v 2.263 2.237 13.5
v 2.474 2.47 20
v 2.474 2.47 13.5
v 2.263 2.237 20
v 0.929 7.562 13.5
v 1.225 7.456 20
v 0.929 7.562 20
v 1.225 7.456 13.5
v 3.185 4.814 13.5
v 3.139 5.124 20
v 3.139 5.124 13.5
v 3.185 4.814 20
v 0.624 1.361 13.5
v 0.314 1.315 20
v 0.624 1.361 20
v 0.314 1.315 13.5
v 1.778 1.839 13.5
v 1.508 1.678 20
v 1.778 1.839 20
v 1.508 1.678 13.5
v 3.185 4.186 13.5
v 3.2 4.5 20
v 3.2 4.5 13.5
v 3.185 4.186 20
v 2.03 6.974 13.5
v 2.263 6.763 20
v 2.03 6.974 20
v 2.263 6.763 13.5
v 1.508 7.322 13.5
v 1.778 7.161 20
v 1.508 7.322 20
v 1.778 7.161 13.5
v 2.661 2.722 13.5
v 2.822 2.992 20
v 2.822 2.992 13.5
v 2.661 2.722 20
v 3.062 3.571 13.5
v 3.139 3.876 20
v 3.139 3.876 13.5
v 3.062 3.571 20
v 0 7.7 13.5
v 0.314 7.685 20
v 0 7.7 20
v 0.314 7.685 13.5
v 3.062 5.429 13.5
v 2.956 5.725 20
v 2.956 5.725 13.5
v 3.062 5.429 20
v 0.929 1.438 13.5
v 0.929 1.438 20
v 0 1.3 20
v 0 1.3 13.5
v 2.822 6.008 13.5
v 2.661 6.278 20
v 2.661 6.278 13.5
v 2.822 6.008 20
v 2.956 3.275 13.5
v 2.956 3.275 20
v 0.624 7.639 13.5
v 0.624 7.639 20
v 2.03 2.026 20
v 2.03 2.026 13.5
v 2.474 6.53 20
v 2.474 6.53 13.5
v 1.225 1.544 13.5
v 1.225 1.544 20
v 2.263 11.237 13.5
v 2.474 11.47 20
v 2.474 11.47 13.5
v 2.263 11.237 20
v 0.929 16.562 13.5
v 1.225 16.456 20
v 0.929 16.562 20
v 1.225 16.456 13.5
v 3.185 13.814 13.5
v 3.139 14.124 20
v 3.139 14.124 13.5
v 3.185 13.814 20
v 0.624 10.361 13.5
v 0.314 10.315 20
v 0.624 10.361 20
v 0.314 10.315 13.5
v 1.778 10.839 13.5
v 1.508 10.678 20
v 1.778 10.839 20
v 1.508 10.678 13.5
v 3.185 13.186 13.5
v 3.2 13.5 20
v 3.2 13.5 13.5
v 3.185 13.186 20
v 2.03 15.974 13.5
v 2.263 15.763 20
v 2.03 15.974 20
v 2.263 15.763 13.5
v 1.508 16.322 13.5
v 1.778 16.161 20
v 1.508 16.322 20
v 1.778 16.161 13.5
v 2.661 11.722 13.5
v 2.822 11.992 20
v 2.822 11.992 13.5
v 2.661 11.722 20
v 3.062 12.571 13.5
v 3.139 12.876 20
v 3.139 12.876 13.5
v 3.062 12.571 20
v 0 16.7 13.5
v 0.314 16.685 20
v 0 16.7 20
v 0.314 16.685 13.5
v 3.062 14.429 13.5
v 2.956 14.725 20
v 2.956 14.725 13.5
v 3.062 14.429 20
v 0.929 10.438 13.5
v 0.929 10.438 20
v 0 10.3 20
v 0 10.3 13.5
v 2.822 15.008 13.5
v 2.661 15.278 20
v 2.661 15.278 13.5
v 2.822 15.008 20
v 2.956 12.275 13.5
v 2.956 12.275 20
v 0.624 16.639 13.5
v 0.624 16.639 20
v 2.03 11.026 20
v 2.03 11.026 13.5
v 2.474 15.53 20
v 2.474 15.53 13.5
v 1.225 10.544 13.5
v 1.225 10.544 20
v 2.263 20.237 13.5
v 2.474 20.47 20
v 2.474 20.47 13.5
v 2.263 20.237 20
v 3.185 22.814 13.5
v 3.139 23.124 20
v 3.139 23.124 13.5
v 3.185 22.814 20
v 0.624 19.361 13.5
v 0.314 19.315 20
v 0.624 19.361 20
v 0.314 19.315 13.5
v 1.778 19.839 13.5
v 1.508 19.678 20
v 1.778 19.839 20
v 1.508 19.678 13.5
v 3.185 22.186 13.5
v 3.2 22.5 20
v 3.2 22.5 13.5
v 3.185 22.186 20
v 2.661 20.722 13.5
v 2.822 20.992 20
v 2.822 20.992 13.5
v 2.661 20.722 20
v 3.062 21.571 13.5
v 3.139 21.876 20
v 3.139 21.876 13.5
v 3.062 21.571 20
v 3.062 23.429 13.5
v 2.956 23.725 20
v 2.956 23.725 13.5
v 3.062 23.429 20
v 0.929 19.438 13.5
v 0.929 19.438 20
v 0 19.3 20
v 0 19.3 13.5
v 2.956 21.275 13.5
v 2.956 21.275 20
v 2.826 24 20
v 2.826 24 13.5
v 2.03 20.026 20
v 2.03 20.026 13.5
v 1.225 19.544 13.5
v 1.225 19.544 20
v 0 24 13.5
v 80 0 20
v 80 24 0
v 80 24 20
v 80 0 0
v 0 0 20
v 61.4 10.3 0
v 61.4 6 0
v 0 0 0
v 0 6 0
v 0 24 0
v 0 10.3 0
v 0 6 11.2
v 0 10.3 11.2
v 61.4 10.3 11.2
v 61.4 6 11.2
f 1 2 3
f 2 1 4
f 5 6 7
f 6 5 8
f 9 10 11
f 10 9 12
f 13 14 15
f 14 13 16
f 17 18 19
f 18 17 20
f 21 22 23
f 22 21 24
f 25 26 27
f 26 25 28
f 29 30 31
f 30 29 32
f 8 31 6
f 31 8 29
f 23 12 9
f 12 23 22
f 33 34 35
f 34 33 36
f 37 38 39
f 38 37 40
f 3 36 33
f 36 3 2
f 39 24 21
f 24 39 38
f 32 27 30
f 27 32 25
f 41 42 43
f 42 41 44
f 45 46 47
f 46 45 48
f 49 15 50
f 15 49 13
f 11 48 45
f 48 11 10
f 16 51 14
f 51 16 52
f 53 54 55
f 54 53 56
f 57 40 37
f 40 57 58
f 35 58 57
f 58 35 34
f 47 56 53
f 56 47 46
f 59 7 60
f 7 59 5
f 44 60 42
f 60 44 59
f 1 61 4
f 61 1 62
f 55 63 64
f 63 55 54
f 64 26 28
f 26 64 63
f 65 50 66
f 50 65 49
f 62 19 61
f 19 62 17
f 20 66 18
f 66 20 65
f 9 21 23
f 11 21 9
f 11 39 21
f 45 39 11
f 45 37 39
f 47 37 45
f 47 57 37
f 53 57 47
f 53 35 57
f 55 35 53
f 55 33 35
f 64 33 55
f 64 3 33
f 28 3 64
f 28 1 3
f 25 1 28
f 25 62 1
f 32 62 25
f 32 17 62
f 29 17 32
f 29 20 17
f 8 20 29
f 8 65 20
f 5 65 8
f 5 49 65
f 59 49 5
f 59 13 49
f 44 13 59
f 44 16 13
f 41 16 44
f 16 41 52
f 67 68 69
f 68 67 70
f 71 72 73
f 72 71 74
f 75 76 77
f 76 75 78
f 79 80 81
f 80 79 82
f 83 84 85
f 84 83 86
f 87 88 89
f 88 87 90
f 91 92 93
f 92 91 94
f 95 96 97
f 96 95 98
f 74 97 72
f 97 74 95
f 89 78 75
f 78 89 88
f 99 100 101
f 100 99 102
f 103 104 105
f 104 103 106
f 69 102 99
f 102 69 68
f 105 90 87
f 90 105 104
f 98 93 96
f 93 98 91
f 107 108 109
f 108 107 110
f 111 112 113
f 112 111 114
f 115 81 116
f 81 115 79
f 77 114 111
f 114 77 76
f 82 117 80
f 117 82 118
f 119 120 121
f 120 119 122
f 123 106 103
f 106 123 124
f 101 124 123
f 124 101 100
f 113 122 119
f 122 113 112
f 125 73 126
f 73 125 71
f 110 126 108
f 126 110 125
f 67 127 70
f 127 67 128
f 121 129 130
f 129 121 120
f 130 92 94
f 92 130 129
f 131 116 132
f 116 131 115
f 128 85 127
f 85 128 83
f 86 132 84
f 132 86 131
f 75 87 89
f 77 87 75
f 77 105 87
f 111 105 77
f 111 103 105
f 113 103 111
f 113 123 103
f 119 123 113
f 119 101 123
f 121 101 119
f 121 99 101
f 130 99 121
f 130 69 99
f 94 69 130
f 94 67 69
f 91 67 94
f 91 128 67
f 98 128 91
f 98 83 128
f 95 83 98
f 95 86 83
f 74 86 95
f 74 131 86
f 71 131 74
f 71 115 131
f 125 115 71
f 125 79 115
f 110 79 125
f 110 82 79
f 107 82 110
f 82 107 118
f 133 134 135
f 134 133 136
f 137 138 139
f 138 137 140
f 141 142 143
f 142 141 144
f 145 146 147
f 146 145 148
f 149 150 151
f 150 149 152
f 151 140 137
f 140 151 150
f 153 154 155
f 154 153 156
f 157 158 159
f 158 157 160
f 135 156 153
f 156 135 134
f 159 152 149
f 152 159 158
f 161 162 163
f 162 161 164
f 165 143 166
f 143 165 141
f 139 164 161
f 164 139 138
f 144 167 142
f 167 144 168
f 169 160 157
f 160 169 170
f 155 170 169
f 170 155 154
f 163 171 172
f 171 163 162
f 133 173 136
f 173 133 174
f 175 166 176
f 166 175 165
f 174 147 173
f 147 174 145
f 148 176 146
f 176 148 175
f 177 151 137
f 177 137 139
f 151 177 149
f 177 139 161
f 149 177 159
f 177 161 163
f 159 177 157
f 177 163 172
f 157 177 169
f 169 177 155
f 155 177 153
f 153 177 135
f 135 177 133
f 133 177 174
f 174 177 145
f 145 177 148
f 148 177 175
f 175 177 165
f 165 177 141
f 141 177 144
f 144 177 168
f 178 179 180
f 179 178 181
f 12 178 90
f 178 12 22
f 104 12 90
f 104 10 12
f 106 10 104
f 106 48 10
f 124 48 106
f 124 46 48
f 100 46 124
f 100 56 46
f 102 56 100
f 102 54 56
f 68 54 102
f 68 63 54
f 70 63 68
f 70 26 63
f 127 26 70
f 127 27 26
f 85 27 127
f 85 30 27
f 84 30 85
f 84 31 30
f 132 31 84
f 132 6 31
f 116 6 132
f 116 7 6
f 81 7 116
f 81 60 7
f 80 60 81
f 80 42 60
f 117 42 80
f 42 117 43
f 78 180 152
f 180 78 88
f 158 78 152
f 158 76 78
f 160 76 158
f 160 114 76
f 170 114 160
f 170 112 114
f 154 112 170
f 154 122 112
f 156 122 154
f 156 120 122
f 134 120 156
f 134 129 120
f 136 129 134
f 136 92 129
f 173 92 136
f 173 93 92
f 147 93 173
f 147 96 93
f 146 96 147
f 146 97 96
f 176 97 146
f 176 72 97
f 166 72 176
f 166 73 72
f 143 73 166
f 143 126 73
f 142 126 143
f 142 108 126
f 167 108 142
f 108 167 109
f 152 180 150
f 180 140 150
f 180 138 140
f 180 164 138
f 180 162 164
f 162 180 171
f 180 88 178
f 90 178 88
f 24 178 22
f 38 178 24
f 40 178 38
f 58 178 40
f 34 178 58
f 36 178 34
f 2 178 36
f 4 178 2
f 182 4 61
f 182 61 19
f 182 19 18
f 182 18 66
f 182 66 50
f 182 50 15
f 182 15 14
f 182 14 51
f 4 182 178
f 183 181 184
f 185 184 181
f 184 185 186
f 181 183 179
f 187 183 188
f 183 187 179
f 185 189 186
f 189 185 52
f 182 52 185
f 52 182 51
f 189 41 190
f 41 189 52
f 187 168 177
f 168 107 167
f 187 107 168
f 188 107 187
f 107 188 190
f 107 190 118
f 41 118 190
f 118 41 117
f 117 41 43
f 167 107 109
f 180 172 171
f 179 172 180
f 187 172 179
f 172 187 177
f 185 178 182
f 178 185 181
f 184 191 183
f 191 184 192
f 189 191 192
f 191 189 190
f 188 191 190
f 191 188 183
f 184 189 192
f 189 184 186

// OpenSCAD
// Magnetic Bead Rack for 8-tube strip

// --- Overall Block Dimensions ---
rack_length_X = 80;   // Total length along X axis (Specification: 80 mm)
rack_width_Y = 24;    // Total width along Y axis (Specification: 24 mm)
rack_height_Z = 20;   // Total height of the block (Specification: 20 mm)

// --- Tube Seat Parameters ---
tube_seat_diameter_top = 6.4; // Top diameter of the tube seat hole (Specification: 6.4 mm)
tube_seat_diameter_bottom = 3.0; // Bottom (narrowed) diameter of the tube seat (Specification: 3 mm)
tube_seat_depth = 12;          // Depth from top face down to Z=8 (Specification: 12 mm)
tube_seat_floor_height = 2;    // Height of the floor at the bottom of the cone (Specification: 2 mm)
tube_seat_spacing = 9;         // Center-to-center spacing between tube seats (Specification: 9 mm)

// --- Magnet Pocket Parameters ---
magnet_length_X = 60.4;       // Length of bar magnet (Specification: 60.4 mm)
magnet_width_Y = 3.3;         // Width of bar magnet (Specification: 3.3 mm)
magnet_height_Z = 10.2;       // Height of bar magnet (Specification: 10.2 mm)

// --- Global Settings ---
$fn = 64; // High resolution for curves

// Calculate offsets for centering the tube seats along Y=0
num_tubes = 8;
total_seat_span = (num_tubes - 1) * tube_seat_spacing;
center_offset_Y = -(total_seat_span / 2); // This centers the array of holes around Y=0

// --- Module Definitions ---

// Tube Seat: A conical hole cut from the top face down to a floor.
module tube_seat(y_pos) {
    // The seat is centered at X=0, and its center line is at Y=y_pos
    translate([0, y_pos, rack_height_Z]) // Start cutting from the top surface (Z=20)
    difference() {
        // 1. Main body of the cut: A cylinder representing the initial large hole
        cylinder(h = tube_seat_depth + 1, r = tube_seat_diameter_top / 2, center = true);

        // 2. The conical taper (cut out from the bottom)
        // Using hull to create a smooth cone shape between two spheres/circles
        translate([0, 0, -tube_seat_depth]) // Position the cone base at Z=0 relative to the cylinder's center
        hull() {
            sphere(r = tube_seat_diameter_top / 2);
            translate([0, 0, -tube_seat_depth]) sphere(r = tube_seat_diameter_bottom / 2);
        }

        // 3. The floor (a solid block that stops the cut)
        // This is placed at Z = rack_height_Z - tube_seat_depth + tube_seat_floor_height
        translate([0, 0, -(tube_seat_depth - tube_seat_floor_height)])
        cube([tube_seat_diameter_top * 1.5, tube_seat_diameter_top * 1.5, tube_seat_floor_height]);

    }
}


// Magnet Pocket: A rectangular cutout for the magnet
module magnet_pocket(y_pos) {
    // The pocket is centered in X (X=0). It extends from Z=0 up to Z=magnet_height_Z.
    translate([0, y_pos, 0])
    cube([magnet_length_X + 1, magnet_width_Y + 1, magnet_height_Z + 1]); // Add padding for cutting clearance
}


// --- Main Assembly ---

difference() {
    // 1. The main solid block (Rack Body)
    // Specification: Centred on the origin in X and Y. Rests on XY plane at Z=0.
    translate([0, 0, 0])
    cube([rack_length_X, rack_width_Y, rack_height_Z]);

    // 2. Tube Seat Holes (Cut along Y=0 line)
    for (i = [0 : num_tubes - 1]) {
        y_pos = center_offset_Y + i * tube_seat_spacing;
        tube_seat(y_pos);
    }

    // 3. Magnet Pockets (Cutouts beside the row)
    // Pocket 1: Y = -6 mm
    magnet_pocket(-6);
    // Pocket 2: Y = +6 mm
    magnet_pocket(6);
}
